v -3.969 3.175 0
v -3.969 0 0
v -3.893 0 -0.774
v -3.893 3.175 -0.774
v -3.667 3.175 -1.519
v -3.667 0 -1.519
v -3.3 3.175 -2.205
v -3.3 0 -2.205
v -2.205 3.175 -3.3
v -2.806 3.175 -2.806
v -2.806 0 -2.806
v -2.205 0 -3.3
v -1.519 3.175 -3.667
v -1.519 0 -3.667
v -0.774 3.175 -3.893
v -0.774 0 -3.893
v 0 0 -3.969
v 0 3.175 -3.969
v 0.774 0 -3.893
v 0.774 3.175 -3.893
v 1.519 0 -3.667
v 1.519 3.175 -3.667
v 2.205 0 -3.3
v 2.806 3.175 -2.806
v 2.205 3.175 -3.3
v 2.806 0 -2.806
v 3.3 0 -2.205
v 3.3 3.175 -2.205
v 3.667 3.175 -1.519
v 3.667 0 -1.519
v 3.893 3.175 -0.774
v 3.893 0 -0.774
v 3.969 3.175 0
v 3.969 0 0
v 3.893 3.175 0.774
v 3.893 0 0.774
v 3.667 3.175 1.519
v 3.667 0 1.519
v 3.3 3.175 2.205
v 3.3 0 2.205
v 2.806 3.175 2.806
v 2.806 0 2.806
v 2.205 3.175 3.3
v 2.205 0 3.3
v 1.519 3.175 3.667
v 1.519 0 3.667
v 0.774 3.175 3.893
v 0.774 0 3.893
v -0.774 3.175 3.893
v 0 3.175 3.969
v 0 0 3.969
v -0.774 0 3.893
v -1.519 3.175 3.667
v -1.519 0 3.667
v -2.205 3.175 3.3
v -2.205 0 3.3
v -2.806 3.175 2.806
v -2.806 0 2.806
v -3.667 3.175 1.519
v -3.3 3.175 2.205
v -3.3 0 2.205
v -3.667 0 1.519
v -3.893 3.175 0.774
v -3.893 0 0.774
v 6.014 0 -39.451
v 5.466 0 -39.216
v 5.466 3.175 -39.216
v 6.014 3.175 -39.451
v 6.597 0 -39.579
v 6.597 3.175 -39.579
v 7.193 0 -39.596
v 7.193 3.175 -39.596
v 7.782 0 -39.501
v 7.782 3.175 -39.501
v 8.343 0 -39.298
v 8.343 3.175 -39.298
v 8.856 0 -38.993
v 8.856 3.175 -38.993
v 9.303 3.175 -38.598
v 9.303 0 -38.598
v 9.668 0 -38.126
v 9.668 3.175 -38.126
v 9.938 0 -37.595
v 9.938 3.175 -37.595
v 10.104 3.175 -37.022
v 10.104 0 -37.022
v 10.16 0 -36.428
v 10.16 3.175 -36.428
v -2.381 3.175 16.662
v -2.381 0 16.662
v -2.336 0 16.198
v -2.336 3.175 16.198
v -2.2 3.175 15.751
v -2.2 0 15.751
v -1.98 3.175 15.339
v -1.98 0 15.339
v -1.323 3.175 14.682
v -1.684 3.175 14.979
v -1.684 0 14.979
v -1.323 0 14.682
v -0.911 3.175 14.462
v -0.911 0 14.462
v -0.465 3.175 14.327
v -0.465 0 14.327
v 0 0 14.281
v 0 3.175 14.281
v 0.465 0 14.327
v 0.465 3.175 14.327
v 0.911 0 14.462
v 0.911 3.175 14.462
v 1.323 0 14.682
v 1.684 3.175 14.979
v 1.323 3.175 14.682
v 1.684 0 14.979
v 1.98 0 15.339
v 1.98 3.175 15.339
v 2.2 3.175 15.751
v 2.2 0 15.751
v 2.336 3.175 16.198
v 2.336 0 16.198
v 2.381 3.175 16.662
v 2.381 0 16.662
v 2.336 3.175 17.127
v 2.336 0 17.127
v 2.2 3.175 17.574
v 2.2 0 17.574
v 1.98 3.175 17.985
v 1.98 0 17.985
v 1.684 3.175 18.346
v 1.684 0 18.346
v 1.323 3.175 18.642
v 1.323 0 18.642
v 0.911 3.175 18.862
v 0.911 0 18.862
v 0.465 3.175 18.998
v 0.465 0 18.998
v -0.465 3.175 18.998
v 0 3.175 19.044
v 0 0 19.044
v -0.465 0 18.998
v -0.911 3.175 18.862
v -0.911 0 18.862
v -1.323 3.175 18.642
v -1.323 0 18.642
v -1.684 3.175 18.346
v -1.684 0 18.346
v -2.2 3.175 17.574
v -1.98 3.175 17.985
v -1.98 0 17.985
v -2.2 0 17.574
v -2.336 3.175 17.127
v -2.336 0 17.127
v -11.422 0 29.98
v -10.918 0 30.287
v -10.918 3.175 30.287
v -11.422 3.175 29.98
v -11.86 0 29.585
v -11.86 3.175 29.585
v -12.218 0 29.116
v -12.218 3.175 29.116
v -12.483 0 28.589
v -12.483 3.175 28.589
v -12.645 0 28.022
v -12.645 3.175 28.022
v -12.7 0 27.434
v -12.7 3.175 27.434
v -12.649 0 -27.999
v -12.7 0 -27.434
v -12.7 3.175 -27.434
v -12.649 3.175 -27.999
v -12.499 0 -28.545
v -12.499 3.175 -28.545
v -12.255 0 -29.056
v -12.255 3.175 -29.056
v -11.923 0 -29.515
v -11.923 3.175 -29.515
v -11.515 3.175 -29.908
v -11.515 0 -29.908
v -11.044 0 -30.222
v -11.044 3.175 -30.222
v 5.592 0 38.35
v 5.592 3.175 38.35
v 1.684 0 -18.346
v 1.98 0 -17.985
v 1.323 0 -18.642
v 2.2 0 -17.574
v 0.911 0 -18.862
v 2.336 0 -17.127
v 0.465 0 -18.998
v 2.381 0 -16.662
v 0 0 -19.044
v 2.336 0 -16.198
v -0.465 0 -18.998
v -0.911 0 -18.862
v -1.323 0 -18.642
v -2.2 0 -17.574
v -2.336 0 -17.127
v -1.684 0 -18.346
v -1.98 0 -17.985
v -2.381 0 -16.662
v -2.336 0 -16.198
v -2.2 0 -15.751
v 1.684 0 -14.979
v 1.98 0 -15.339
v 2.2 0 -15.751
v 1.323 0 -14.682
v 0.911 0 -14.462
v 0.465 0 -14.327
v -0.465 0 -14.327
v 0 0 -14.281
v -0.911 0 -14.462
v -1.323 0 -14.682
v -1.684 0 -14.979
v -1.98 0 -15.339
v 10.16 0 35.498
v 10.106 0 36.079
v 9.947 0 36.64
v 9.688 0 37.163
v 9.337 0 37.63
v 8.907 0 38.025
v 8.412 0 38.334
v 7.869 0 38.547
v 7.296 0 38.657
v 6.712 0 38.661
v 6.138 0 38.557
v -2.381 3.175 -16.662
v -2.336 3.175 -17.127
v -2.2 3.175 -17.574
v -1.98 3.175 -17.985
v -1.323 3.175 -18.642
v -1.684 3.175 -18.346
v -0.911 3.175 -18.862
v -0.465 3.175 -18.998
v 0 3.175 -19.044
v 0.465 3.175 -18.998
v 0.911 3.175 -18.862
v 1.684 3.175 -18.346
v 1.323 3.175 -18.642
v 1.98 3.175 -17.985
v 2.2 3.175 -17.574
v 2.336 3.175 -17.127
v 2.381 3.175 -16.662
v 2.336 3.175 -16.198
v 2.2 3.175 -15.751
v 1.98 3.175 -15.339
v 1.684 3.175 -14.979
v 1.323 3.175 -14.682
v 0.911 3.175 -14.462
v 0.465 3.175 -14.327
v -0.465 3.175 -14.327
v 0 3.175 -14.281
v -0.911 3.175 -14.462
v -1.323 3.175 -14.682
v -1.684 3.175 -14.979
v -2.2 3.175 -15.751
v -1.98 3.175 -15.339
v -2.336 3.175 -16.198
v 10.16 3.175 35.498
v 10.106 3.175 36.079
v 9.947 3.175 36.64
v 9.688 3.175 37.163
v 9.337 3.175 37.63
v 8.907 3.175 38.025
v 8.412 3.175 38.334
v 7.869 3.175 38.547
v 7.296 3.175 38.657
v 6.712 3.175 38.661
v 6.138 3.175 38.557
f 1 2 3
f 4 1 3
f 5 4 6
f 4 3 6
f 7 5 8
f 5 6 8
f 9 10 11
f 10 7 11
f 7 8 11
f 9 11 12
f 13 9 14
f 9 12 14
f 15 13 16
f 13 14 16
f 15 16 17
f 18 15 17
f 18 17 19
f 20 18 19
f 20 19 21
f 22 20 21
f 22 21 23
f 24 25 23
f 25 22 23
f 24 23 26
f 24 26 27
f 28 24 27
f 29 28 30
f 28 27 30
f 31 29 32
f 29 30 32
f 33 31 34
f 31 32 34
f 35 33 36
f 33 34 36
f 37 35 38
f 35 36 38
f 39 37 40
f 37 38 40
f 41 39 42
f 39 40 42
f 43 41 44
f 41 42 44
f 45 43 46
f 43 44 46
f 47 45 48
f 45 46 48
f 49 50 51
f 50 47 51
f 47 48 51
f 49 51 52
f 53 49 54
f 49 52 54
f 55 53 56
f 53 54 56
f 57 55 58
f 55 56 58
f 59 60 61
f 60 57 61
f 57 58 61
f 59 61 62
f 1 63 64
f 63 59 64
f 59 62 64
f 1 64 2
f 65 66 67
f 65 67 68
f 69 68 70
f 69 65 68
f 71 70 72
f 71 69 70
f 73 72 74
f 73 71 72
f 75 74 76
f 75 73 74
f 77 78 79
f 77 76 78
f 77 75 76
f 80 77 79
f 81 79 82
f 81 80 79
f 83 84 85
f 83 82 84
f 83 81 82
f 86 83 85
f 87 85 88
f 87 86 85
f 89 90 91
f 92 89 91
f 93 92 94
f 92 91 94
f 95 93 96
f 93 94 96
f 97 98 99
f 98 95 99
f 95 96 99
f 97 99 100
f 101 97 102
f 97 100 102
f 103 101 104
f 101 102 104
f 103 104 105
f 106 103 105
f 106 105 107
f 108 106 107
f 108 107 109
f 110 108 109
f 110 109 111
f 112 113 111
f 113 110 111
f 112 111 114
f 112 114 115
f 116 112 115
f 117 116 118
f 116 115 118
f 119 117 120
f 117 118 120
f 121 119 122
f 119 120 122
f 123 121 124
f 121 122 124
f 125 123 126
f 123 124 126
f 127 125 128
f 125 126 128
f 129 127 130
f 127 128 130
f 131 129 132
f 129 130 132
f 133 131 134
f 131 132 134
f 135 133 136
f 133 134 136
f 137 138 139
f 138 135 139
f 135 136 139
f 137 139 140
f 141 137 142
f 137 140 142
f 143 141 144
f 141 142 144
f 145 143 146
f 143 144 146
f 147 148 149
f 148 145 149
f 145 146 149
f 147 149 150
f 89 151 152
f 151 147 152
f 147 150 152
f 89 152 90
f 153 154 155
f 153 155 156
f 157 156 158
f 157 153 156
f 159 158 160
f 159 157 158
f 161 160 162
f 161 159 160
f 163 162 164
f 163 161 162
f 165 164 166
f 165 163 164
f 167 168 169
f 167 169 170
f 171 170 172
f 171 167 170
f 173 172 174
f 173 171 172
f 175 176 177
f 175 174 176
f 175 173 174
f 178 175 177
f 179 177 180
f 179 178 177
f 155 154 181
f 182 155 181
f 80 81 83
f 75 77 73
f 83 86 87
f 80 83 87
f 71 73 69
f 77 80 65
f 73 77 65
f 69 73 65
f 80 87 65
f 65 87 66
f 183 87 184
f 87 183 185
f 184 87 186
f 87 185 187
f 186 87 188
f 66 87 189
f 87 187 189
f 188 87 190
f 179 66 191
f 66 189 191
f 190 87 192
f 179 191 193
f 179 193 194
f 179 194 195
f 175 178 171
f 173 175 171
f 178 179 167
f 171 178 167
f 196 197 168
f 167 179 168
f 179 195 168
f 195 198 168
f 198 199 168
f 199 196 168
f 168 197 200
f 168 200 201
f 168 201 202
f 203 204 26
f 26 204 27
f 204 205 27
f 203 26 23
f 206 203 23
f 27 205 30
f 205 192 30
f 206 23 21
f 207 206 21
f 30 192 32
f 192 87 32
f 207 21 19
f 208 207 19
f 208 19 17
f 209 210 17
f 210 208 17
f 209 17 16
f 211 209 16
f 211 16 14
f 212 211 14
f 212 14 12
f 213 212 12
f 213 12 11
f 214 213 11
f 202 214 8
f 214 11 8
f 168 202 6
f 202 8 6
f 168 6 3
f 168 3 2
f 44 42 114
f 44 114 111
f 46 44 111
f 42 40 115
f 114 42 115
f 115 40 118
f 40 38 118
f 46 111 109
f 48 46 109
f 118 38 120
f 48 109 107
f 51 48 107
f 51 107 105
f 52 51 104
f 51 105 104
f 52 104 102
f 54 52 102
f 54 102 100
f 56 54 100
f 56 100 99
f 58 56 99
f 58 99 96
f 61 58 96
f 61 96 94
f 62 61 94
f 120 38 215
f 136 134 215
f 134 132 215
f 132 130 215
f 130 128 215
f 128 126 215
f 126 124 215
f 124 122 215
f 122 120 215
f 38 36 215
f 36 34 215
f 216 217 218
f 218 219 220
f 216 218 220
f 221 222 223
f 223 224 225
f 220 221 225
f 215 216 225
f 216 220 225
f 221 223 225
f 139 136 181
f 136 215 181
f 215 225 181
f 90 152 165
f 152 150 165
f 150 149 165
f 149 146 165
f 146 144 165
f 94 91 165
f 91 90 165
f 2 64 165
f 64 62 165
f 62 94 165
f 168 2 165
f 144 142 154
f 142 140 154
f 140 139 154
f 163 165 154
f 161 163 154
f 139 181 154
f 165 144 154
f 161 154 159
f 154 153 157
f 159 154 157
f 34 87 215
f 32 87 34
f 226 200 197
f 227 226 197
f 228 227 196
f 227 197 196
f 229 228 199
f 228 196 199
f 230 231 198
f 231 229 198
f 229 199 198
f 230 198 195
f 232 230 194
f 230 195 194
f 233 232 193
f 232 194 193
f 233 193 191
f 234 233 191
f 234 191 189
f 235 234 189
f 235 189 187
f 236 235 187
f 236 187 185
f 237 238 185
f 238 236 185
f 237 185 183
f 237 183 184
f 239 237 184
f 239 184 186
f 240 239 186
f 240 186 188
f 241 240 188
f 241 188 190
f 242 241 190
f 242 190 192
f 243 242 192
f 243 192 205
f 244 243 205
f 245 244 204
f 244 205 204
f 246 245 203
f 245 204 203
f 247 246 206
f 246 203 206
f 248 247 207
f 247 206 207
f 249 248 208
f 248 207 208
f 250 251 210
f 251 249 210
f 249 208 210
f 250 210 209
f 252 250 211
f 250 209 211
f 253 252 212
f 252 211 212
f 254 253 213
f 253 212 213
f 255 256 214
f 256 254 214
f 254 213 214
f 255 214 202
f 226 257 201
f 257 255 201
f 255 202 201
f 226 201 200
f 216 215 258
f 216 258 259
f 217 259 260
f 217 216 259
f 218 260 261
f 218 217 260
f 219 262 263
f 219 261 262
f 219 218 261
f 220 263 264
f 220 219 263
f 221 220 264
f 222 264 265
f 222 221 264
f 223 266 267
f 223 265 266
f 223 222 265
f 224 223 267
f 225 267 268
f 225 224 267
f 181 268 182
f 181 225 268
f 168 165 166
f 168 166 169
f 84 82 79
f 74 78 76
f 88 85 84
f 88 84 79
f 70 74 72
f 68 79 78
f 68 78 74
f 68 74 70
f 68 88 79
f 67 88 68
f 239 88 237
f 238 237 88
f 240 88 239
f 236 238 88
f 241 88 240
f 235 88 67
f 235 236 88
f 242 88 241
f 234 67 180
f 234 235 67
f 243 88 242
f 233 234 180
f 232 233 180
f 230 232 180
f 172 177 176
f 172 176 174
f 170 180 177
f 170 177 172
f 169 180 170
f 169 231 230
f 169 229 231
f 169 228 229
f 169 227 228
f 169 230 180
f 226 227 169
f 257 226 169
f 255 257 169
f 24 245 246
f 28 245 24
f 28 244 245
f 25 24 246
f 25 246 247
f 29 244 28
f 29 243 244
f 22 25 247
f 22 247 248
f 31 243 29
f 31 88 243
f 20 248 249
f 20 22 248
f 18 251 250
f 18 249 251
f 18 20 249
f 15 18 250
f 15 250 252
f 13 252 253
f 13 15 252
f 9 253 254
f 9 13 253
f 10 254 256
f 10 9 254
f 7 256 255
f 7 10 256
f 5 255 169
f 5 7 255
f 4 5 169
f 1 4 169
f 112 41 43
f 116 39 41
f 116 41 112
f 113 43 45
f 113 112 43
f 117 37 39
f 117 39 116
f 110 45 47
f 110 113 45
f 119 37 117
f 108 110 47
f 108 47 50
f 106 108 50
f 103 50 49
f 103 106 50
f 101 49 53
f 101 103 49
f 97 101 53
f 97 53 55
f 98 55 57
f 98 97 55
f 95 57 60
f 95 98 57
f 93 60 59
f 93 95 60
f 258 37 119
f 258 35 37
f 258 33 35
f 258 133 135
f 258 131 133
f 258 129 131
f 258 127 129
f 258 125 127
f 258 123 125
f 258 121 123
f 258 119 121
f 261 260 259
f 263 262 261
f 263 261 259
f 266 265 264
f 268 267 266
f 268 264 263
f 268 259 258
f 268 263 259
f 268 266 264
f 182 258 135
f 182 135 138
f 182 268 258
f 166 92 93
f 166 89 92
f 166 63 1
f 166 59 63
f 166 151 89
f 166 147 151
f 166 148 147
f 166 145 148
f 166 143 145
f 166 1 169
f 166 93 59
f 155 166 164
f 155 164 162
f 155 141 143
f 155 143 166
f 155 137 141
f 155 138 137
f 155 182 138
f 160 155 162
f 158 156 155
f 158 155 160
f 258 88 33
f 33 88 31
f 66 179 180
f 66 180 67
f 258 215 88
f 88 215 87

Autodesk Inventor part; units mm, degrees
ref_plane "YZ Plane" through (0, 0, 0) normal (1, 0, 0) x (0, 1, 0)
ref_plane "XZ Plane" through (0, 0, 0) normal (0, 1, 0) x (-1, 0, 0)
ref_plane "XY Plane" through (0, 0, 0) normal (0, 0, 1) x (1, 0, 0)
sketch "Sketch1" plane through (0, 0, 0) normal (0, 1, 0) x (-1, 0, 0)
  circle A0 centre (0, 0) radius 3.9688
  circle A1 centre (0, -16.6624) radius 2.3813
  circle A2 centre (0, 16.6624) radius 2.3813
  line L0 (12.7, 27.4344) -> (12.7, -27.4344)
  line L1 (-10.16, 35.4975) -> (-10.16, -36.4279)
  line L2 (10.9183, 30.2873) -> (-5.5917, 38.3505)
  line L3 (12.7, 29.4172) -> (45.9346, 29.4172) construction
  line L4 (-10.16, -0.5957) -> (-17.3723, -0.5957) construction
  line L5 (11.0438, -30.2225) -> (-5.4662, -39.2161)
  arc A3 (-5.5917, 38.3505) -> (-10.16, 35.4975) centre (-6.985, 35.4975) ccw
  arc A4 (12.7, 27.4344) -> (10.9183, 30.2873) centre (9.525, 27.4344) ccw
  arc A5 (11.0438, -30.2225) -> (12.7, -27.4344) centre (9.525, -27.4344) ccw
  arc A6 (-10.16, -36.4279) -> (-5.4662, -39.2161) centre (-6.985, -36.4279) ccw
  point P0 (12.7, -29.3203)
  point P1 (12.7, 0)
  point P2 (-10.16, -41.773)
  point P3 (-10.16, 40.5816)
  dimension "d0" = 7.9375
  dimension "d1" = 4.7625
  dimension "d2" = 16.6624
  dimension "d3" = 4.7625
  dimension "d4" = 16.6624
  dimension "d5" = 12.7
  dimension "d6" = 58.7375
  dimension "d7" = 22.86
  dimension "d8" = 153.97
  dimension "d9" = 3.175
extrude "Extrusion1" add sketch "Sketch1" along normal blind 3.175
properties part number "Bumper_Lock_Plate"
